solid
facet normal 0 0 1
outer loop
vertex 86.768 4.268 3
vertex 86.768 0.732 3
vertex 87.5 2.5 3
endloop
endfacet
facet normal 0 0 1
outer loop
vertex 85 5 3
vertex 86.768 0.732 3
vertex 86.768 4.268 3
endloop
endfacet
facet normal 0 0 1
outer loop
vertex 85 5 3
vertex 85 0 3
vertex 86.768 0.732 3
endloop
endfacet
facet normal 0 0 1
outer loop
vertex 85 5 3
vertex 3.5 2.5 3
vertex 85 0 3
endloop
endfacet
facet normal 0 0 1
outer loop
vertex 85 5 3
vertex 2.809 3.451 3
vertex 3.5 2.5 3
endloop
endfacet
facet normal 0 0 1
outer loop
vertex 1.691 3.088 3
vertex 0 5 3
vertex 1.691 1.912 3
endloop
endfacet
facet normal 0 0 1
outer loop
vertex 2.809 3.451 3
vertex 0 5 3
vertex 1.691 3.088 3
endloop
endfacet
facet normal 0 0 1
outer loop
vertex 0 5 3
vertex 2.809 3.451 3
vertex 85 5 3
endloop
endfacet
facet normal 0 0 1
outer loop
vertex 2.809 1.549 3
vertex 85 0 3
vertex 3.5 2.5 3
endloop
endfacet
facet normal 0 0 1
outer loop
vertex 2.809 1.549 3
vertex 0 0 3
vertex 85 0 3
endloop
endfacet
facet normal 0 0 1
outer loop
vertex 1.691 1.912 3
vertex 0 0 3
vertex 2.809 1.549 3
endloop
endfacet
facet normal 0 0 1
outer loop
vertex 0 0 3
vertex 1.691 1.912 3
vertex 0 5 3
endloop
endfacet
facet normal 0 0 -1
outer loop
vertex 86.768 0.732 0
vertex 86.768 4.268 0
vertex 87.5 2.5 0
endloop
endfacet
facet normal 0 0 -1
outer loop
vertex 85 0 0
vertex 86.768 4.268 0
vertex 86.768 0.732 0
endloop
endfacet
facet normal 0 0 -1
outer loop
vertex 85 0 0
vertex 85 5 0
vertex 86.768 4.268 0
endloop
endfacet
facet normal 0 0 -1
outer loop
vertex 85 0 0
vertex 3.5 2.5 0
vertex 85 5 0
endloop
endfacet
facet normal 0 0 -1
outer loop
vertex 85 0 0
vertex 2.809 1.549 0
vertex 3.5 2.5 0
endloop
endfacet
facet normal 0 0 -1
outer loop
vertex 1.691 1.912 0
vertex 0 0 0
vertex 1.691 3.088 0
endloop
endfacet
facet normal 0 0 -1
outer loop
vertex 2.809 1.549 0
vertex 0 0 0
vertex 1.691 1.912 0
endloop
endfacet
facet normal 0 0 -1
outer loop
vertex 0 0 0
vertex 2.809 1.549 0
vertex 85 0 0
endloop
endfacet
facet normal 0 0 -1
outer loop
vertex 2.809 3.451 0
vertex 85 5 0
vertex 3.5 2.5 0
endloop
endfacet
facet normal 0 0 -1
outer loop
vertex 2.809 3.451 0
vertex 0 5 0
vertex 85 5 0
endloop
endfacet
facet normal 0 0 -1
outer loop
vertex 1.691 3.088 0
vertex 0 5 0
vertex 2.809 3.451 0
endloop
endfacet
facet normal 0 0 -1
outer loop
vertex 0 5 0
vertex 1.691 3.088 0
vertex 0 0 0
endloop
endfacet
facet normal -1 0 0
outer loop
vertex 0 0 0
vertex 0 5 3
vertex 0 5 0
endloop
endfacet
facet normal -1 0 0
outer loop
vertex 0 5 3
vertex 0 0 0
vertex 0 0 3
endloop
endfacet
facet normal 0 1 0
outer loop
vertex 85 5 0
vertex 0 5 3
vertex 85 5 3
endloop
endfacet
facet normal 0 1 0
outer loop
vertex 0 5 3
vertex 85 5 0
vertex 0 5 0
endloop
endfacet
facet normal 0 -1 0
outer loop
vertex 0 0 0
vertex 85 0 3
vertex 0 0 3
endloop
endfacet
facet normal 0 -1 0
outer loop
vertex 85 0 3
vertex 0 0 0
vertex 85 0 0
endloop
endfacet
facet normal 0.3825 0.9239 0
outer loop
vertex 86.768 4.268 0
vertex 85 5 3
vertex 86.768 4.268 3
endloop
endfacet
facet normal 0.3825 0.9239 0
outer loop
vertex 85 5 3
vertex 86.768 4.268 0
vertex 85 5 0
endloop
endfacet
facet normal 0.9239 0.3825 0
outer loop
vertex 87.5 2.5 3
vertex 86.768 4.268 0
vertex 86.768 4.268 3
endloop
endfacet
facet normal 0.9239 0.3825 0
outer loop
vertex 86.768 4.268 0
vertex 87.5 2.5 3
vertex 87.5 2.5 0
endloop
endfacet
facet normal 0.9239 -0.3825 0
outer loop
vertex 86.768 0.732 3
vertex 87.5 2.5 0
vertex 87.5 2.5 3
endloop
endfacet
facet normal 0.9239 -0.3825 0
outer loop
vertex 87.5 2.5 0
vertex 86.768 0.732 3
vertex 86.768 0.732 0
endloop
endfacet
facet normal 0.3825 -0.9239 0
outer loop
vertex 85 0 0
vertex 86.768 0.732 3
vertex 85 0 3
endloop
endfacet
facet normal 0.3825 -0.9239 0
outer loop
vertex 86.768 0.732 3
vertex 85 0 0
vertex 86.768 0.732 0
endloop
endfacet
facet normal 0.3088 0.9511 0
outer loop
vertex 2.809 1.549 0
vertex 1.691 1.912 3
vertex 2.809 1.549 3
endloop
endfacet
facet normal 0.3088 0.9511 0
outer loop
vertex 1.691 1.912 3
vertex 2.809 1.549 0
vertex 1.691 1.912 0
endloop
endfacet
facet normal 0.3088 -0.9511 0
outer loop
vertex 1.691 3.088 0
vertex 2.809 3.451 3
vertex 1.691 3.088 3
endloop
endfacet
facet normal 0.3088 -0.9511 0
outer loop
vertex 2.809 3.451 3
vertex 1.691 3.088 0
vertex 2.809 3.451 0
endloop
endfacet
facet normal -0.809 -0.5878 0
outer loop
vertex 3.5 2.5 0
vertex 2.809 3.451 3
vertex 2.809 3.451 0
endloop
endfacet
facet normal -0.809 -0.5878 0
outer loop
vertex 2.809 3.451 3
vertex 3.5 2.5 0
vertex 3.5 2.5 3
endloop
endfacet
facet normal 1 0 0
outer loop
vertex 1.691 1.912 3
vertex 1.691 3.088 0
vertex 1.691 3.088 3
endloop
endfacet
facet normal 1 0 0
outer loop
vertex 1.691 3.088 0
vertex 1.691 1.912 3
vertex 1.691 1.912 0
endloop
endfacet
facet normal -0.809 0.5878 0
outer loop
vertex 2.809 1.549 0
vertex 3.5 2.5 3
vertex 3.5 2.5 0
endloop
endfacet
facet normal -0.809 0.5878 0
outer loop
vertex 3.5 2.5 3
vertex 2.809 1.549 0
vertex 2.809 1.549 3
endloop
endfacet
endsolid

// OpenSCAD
difference(){
	union() {
		cube([85,5,3]);

		translate([85,2.5,0]) {
			cylinder(3,2.5,2.5);
		}
	}

	translate([2.5,2.5,-5]) {
		cylinder(10,1,1);
	}
}
